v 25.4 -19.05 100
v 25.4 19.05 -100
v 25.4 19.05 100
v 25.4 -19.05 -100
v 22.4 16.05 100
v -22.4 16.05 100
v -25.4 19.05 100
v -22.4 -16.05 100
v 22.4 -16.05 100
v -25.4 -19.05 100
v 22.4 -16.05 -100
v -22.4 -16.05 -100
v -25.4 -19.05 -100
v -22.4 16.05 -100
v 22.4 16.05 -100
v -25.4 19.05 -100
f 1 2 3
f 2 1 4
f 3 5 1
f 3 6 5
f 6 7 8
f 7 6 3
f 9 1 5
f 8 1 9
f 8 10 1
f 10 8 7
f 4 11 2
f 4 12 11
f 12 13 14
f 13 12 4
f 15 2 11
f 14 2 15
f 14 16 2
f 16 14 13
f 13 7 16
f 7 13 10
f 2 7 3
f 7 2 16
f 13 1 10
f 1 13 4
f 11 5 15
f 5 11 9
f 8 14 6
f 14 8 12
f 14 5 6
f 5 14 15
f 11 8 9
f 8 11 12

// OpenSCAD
// Aluminium rectangular box section: 50.8mm x 38.1mm x 3.0mm wall
// Single connected solid: hollow rectangular tube only (no extra features)

outer_width_mm     = 50.8;
outer_height_mm    = 38.1;
wall_thickness_mm  = 3.0;
length_mm          = 200;

eps_mm = 0.05; // small overlap to ensure robust boolean

module box_section_tube(ow, oh, t, L) {
    // Inner dimensions (must be positive)
    iw = ow - 2*t;
    ih = oh - 2*t;

    assert(iw > 0 && ih > 0, "Wall thickness too large for given outer dimensions.");

    // Use translate on inner cut so it is guaranteed to pass fully through the outer solid
    difference() {
        cube([ow, oh, L], center=true);
        translate([0, 0, 0])
            cube([iw, ih, L + 2*eps_mm], center=true);
    }
}

box_section_tube(outer_width_mm, outer_height_mm, wall_thickness_mm, length_mm);
